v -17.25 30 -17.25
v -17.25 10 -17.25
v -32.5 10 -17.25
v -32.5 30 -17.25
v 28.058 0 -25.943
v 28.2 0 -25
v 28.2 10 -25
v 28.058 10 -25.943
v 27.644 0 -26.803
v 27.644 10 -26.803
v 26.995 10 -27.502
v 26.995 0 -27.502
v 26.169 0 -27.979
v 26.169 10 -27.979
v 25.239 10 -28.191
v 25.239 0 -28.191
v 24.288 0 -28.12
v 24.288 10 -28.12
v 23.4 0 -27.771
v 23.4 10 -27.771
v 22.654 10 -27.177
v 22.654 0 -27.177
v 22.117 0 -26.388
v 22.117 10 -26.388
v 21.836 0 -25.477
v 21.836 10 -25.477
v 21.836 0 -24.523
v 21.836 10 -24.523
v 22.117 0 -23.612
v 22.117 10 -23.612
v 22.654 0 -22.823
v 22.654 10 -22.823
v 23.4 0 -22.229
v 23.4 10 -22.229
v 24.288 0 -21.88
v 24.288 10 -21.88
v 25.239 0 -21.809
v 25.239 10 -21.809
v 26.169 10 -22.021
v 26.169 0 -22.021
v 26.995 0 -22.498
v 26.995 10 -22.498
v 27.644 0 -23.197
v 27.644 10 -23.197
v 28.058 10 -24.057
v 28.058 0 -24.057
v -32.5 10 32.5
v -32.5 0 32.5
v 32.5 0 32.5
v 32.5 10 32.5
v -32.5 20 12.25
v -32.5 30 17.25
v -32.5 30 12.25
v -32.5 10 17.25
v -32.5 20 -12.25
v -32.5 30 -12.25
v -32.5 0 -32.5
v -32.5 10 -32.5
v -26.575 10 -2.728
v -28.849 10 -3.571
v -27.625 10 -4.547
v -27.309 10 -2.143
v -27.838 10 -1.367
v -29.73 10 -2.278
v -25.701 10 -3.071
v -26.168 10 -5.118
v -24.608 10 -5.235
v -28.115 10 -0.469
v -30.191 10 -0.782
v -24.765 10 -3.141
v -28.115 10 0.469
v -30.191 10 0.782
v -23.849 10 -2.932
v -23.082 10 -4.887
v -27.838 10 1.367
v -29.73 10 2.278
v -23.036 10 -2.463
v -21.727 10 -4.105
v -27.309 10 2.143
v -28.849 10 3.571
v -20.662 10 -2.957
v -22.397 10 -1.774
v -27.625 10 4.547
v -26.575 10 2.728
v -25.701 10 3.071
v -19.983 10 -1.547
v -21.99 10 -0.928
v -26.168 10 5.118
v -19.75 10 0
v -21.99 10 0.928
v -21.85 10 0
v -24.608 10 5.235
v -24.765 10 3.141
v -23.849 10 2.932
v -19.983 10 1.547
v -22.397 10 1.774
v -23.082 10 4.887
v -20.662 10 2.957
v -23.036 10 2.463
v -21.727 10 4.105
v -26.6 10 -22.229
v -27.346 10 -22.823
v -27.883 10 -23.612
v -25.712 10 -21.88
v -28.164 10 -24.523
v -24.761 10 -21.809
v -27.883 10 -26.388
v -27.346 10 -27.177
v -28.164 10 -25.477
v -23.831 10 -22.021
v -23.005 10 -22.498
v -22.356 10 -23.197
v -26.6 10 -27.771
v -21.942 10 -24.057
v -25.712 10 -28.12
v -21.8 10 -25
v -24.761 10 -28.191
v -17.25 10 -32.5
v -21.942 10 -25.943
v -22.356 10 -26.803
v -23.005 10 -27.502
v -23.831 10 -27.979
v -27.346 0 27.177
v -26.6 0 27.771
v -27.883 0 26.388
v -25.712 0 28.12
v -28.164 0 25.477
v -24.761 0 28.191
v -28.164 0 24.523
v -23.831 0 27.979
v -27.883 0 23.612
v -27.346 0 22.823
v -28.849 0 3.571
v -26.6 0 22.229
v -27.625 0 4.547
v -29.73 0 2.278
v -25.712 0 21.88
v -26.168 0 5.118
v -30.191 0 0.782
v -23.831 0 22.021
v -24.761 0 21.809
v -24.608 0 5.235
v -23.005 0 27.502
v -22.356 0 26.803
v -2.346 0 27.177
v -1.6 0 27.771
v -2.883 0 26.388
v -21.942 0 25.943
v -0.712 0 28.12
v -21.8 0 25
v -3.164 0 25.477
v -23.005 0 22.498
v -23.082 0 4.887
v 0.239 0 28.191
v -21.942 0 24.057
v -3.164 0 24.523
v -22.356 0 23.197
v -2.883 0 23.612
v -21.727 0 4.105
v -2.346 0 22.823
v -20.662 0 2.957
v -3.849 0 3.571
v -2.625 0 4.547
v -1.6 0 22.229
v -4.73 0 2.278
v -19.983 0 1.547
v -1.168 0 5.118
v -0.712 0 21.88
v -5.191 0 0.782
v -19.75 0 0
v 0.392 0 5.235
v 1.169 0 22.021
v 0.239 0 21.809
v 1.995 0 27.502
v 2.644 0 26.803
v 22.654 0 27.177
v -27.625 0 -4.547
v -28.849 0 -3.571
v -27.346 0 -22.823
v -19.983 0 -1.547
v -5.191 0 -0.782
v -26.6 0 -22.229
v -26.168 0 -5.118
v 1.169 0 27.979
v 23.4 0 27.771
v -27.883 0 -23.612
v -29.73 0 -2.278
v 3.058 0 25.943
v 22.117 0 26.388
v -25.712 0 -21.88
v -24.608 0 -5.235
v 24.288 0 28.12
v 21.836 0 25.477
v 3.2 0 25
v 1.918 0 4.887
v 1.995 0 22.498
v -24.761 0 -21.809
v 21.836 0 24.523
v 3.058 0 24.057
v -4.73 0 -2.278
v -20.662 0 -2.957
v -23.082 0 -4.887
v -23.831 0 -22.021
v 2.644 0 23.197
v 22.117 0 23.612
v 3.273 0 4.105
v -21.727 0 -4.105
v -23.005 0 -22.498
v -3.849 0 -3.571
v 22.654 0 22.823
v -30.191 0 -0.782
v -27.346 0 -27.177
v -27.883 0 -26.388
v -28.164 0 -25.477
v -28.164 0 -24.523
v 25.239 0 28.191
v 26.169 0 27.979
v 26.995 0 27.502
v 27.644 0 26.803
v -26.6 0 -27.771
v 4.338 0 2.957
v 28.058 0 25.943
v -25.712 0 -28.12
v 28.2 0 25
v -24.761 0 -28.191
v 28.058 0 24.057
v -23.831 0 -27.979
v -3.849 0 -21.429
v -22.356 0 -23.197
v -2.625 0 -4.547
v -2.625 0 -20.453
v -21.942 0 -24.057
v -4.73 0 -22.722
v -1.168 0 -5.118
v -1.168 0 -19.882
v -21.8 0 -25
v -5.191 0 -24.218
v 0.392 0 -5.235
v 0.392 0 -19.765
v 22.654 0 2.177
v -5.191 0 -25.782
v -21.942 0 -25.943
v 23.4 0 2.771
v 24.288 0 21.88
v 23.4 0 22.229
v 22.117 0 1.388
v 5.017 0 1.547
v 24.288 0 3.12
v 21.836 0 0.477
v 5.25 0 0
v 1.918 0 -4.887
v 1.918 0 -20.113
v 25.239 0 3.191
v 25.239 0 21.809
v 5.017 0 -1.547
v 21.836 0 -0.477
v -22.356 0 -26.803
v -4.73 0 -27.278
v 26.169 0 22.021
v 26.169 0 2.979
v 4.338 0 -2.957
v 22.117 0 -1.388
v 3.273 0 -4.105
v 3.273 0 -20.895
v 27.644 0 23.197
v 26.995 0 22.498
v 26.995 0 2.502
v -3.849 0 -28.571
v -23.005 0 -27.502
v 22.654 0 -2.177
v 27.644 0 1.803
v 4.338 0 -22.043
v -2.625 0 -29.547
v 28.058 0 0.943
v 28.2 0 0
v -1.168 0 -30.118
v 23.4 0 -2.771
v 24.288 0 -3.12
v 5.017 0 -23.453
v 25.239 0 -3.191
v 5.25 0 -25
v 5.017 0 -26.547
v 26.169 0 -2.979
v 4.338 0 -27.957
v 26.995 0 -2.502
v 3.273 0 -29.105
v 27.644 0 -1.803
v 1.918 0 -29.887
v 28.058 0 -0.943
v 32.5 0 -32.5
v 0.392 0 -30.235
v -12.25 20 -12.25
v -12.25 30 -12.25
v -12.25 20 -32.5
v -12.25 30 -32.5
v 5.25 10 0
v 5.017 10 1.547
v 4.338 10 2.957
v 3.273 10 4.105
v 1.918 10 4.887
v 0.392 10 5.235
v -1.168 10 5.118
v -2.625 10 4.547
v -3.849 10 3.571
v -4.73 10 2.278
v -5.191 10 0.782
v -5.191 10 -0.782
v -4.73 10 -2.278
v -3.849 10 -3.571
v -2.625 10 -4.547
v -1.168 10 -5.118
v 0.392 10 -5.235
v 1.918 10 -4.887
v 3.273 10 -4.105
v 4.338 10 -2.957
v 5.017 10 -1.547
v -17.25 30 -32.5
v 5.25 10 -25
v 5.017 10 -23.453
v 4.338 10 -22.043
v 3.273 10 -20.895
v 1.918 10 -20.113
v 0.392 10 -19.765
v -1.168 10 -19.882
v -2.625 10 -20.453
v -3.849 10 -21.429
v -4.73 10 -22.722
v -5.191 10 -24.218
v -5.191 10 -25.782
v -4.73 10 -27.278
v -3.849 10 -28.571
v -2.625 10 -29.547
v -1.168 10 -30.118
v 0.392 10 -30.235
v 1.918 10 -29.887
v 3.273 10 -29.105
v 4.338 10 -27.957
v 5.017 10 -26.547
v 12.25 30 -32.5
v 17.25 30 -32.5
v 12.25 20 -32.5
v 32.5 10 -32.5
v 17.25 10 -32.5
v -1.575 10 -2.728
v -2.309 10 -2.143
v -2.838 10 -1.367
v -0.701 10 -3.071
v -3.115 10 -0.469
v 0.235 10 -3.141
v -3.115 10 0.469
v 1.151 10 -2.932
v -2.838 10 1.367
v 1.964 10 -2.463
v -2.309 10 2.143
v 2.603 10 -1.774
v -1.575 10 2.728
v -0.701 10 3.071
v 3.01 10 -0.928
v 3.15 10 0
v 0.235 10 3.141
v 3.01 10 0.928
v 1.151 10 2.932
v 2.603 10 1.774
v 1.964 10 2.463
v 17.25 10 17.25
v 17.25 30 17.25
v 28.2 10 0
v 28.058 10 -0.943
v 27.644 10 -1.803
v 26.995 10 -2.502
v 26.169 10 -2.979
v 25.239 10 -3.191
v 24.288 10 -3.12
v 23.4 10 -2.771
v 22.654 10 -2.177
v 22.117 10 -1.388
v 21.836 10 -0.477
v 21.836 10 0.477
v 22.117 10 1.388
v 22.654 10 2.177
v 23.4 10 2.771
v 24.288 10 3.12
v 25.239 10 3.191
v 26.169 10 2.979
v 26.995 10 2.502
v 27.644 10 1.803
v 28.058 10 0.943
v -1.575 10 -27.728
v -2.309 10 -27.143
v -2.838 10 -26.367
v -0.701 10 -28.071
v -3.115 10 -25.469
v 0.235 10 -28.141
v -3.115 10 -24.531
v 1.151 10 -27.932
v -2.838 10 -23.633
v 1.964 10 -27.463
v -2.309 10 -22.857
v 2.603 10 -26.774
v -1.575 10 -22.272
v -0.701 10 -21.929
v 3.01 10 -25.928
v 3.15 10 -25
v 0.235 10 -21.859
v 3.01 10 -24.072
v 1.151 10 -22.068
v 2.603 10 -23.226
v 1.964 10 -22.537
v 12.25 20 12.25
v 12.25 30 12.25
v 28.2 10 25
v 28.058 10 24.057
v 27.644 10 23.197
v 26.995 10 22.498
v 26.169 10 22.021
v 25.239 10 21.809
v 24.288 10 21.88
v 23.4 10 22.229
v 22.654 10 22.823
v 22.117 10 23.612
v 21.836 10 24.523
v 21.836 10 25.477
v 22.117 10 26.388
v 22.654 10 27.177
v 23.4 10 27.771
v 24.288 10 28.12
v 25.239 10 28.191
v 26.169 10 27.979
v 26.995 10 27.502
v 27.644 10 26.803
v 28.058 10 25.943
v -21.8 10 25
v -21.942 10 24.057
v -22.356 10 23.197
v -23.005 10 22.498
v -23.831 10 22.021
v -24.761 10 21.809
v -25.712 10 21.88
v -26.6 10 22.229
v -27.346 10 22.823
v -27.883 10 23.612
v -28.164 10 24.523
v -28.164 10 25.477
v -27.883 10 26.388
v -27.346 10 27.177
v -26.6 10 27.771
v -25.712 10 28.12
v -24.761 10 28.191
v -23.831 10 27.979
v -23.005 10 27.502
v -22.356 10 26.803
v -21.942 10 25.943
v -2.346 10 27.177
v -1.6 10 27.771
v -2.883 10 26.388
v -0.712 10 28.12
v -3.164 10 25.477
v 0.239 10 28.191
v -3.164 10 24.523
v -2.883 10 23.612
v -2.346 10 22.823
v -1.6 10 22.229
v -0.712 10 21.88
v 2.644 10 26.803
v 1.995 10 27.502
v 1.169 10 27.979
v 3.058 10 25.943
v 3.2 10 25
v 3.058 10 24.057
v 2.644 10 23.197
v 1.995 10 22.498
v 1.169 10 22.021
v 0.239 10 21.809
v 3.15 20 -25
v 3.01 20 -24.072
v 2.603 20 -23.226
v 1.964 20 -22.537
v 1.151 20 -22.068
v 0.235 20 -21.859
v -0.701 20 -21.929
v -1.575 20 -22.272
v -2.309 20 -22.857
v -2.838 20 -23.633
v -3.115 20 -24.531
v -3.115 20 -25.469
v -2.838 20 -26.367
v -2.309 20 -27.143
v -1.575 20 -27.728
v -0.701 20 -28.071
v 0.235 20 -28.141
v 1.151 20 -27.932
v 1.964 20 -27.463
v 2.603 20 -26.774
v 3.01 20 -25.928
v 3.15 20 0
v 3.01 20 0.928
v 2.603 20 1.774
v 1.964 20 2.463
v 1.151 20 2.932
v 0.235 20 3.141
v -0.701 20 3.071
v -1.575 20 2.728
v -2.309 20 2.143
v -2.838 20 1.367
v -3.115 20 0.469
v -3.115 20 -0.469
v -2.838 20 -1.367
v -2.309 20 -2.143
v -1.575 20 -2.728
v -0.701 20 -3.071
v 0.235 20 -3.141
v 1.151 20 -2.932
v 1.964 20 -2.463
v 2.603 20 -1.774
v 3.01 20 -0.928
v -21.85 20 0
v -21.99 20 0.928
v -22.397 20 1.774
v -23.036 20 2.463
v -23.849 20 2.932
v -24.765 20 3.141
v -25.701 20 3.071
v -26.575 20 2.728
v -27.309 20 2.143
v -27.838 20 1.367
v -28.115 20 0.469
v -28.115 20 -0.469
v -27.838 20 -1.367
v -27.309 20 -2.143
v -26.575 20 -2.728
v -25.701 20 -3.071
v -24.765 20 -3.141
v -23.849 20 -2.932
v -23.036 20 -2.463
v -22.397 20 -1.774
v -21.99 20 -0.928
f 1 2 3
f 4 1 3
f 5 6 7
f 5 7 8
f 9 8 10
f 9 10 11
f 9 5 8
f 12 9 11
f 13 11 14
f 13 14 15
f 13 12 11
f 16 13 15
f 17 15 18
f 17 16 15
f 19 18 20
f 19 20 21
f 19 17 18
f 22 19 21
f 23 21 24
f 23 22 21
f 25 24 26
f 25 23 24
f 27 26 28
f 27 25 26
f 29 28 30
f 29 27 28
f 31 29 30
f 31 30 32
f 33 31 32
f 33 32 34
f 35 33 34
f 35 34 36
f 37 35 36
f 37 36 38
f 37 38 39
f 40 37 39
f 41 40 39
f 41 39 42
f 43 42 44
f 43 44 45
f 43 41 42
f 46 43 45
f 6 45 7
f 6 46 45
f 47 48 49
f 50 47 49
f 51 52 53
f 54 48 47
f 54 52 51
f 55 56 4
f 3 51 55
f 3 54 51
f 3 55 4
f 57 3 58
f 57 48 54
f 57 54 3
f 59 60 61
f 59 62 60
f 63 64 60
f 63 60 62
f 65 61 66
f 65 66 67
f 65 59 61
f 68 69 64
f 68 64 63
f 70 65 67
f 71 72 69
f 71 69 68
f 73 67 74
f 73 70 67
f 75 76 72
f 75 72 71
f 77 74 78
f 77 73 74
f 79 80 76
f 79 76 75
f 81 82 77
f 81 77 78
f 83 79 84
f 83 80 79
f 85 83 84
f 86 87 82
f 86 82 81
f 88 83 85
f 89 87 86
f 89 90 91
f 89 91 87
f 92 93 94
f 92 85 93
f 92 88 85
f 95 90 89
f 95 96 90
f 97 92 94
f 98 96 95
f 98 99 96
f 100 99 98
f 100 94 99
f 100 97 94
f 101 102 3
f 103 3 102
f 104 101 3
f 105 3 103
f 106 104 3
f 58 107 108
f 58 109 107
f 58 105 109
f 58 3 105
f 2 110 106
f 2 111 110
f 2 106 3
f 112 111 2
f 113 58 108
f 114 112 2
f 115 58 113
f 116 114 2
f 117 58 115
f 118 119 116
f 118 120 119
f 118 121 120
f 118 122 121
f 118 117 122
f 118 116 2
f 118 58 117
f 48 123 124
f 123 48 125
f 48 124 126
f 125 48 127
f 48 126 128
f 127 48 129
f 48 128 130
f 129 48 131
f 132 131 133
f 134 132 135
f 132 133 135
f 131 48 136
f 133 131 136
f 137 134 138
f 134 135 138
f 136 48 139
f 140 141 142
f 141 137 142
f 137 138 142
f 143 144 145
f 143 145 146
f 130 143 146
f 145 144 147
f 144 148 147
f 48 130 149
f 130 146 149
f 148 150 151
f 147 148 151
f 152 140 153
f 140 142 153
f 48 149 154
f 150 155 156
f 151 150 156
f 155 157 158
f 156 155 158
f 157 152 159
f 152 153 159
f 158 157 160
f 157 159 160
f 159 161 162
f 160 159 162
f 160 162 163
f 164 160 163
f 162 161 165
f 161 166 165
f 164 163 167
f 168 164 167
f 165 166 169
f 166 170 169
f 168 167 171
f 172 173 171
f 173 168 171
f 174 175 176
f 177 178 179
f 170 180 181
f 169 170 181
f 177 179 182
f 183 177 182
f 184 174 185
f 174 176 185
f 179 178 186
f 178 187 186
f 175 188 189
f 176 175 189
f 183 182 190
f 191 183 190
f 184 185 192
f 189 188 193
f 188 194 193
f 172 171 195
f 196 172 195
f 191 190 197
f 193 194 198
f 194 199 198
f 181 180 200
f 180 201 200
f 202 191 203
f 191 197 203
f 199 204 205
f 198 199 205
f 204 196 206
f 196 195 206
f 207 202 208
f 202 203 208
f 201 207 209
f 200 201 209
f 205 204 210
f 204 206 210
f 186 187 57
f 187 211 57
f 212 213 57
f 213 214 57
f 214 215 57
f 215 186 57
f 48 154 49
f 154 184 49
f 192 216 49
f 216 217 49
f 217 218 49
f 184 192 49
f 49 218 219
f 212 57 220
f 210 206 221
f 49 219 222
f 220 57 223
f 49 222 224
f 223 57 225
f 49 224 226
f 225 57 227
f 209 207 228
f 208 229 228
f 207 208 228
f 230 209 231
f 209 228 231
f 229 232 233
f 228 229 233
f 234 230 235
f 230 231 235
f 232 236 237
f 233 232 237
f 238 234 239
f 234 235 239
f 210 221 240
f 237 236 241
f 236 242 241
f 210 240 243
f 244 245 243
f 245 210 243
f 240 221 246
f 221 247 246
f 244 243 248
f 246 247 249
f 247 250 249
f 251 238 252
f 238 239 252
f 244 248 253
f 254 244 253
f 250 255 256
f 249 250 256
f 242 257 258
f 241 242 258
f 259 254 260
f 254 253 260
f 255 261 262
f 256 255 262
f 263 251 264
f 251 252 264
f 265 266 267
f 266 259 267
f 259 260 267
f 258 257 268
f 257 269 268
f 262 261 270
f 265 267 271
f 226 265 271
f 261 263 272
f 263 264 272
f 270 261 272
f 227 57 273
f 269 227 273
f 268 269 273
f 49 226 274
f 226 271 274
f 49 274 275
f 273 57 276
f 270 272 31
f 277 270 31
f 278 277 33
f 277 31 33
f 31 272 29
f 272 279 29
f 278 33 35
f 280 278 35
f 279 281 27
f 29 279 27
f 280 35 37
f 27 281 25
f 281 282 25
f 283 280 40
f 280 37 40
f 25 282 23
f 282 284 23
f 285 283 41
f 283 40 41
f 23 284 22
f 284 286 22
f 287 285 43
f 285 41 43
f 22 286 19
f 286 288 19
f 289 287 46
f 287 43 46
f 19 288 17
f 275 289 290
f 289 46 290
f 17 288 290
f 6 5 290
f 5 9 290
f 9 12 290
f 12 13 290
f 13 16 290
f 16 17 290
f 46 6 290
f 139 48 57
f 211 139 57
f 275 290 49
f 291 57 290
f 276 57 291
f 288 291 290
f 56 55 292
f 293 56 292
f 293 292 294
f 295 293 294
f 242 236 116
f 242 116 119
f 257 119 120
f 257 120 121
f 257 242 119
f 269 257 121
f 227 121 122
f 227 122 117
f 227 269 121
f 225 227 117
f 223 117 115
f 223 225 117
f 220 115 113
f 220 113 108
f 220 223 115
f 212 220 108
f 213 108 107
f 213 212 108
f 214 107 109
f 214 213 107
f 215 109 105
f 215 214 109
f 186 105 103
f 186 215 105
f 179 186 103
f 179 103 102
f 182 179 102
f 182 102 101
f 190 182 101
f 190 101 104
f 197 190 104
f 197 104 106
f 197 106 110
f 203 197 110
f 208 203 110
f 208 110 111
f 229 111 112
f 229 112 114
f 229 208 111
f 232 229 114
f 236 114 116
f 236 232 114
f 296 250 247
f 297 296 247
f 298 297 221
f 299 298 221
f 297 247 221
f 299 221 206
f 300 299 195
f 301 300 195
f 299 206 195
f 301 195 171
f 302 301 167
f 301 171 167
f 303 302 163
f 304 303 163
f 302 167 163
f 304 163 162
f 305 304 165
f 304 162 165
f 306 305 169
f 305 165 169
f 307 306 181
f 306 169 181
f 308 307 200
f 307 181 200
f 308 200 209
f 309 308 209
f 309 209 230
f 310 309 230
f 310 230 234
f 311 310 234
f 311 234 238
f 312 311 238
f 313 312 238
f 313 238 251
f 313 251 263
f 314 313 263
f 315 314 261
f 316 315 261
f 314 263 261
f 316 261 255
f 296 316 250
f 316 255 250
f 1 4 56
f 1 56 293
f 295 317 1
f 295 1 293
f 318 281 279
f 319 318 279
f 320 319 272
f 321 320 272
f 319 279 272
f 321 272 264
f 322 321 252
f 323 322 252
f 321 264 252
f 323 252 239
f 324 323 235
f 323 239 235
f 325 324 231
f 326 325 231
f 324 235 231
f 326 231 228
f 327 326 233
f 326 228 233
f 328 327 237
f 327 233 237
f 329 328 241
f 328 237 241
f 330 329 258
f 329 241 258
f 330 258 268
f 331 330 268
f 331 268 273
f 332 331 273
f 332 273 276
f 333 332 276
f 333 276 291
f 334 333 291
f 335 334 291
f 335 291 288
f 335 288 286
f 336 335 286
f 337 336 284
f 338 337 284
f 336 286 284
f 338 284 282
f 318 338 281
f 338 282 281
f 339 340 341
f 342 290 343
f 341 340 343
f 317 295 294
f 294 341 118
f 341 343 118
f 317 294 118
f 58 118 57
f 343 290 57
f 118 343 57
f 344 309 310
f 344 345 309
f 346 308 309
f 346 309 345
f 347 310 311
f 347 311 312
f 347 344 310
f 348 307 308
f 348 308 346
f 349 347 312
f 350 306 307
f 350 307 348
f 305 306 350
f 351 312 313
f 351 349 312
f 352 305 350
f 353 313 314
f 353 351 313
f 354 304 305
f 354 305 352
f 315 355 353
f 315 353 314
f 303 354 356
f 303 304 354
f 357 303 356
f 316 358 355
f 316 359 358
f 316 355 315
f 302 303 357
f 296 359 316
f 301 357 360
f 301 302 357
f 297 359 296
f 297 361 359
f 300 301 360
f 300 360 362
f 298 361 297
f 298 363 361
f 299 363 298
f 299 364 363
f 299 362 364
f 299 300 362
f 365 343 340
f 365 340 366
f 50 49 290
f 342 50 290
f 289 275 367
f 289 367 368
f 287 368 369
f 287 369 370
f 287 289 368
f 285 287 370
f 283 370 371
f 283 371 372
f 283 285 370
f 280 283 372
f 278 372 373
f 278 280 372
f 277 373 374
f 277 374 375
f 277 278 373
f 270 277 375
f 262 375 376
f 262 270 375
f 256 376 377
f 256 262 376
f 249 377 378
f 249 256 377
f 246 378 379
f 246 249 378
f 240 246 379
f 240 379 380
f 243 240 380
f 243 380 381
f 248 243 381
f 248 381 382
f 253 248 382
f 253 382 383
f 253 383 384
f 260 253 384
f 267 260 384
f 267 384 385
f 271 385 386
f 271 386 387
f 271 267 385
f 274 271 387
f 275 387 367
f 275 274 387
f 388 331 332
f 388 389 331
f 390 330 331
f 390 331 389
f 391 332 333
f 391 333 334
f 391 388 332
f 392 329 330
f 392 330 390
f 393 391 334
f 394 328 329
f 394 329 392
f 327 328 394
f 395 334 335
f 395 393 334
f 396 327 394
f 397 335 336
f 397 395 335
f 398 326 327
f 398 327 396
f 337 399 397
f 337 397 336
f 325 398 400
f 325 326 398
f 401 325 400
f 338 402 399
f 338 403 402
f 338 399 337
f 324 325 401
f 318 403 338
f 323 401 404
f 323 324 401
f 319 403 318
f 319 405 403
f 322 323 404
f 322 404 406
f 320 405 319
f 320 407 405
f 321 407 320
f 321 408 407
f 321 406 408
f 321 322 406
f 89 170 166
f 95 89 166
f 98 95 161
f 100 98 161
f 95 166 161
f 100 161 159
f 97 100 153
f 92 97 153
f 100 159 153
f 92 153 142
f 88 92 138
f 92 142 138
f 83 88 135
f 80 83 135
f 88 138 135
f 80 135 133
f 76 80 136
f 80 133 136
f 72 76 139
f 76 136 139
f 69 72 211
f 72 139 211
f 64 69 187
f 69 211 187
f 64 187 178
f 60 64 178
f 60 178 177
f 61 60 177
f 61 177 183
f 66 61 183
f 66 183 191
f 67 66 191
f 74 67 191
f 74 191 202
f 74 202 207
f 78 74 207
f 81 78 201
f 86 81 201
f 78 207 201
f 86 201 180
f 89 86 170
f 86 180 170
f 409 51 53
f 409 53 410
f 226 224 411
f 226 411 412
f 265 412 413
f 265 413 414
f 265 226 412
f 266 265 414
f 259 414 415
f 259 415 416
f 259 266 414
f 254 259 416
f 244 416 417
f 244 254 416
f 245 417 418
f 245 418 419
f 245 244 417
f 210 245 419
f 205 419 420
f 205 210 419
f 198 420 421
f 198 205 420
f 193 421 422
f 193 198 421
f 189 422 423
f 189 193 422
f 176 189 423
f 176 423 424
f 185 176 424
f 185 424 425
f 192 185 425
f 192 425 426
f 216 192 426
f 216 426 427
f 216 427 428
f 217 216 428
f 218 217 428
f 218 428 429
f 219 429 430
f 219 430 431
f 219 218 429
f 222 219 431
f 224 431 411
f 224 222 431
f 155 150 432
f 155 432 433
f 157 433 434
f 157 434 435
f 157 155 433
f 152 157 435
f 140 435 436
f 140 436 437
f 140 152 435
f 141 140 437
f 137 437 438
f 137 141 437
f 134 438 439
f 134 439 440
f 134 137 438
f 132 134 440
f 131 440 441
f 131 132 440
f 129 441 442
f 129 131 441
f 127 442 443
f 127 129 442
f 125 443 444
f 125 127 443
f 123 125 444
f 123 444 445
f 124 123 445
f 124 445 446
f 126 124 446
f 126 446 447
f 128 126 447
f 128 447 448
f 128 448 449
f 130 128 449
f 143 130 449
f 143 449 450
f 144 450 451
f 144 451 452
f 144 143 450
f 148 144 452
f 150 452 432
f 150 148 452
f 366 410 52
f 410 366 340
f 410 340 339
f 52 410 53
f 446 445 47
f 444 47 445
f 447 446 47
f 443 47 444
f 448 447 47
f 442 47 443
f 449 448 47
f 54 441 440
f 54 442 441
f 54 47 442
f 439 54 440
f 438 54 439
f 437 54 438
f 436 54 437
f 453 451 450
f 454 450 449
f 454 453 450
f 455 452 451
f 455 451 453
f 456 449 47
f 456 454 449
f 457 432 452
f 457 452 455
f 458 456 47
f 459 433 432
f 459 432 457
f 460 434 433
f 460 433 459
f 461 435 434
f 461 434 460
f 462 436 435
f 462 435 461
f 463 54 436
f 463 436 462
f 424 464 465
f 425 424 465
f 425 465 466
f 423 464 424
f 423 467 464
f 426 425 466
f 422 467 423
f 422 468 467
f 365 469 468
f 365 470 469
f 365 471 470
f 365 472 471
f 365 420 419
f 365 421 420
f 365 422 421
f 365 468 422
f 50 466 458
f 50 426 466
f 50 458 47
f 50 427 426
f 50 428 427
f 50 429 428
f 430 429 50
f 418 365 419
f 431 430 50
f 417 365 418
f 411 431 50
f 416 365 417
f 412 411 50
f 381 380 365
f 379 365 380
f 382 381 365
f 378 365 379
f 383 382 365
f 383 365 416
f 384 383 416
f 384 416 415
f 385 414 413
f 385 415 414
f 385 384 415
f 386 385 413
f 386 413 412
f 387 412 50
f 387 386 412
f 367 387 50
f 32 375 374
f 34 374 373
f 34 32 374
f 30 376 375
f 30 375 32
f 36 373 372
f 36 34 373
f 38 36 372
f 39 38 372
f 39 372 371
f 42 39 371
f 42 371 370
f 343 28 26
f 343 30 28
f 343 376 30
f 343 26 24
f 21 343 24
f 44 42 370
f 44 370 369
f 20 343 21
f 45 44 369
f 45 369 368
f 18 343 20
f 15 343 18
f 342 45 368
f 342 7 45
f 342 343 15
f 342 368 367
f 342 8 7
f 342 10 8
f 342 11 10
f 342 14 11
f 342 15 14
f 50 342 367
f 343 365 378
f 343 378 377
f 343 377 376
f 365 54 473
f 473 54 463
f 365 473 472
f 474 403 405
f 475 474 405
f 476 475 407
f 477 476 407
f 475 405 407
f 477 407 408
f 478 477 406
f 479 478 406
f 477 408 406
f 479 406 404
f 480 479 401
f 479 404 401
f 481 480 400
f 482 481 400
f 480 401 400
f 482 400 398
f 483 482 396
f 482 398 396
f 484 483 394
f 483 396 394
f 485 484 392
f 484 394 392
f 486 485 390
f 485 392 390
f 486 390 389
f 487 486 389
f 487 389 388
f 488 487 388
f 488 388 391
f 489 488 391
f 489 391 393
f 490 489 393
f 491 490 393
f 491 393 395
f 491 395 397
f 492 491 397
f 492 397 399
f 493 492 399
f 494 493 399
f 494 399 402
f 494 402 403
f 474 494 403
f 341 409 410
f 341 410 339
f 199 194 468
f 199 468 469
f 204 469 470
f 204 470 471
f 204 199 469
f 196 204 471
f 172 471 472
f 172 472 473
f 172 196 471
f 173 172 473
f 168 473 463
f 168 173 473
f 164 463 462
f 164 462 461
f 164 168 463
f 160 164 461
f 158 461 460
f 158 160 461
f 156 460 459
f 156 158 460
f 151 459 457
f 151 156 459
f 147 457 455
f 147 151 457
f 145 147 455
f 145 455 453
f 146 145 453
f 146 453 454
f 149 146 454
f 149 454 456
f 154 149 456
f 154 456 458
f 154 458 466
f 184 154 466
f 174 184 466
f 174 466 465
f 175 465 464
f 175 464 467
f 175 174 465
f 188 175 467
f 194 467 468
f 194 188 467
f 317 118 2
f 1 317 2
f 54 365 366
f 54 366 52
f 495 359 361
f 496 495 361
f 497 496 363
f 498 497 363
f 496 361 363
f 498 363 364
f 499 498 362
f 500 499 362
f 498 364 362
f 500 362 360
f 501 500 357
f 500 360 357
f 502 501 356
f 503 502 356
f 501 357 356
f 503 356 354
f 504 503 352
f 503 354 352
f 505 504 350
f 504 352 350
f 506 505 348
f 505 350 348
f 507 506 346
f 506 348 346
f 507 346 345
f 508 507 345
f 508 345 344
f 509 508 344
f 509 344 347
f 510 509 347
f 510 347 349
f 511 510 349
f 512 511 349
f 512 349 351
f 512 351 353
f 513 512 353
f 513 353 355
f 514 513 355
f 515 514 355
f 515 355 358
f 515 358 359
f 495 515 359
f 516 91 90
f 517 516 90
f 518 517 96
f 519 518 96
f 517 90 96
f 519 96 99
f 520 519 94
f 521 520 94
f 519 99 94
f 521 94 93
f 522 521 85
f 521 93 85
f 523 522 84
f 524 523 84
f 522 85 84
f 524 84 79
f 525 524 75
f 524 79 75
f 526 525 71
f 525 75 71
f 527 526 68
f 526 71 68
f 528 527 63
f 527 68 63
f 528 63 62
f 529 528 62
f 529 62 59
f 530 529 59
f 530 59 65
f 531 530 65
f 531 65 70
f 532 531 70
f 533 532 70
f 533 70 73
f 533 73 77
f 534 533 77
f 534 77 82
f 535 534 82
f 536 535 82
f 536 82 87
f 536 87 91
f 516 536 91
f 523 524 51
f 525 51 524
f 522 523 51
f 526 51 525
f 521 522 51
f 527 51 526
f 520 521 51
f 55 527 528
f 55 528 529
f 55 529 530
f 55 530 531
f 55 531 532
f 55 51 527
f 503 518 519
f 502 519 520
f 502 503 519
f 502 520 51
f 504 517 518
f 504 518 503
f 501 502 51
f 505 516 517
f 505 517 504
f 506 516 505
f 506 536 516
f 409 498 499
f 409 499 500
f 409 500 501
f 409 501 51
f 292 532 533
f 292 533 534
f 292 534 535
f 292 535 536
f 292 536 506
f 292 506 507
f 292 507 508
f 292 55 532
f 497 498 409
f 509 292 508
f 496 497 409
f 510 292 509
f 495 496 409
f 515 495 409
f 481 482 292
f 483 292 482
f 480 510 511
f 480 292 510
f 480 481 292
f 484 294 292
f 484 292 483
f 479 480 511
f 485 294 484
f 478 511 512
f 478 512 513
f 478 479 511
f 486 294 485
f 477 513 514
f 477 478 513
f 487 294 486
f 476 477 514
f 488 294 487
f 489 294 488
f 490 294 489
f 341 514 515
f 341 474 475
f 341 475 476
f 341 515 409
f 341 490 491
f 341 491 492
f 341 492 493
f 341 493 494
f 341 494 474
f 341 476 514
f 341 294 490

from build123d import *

# Parameters (mm, degrees)
SKETCH_1_W          = 65
SKETCH_1_H          = 65
SKETCH_1_R          = 3.2
EXTRUDE_1_DEPTH     = 10
EXTRUDE_3_DEPTH     = 10
SKETCH_4_R          = 5.25
CUT_EXTRUDE_1_DEPTH = 10
SKETCH_5_R          = 3.15
CUT_EXTRUDE_2_DEPTH = 20
EXTRUDE_4_DEPTH     = 20


with BuildPart() as part:
    # 스케치1 → 보스-돌출1 (new body)
    with BuildSketch(Plane(origin=(0, 0, 0), x_dir=(1, 0, 0), z_dir=(0, 1, 0))):
        Rectangle(SKETCH_1_W, SKETCH_1_H)
        with Locations((25, 0)):
            Circle(SKETCH_1_R, mode=Mode.SUBTRACT)
        with Locations((0, -25)):
            Circle(SKETCH_1_R, mode=Mode.SUBTRACT)
        with Locations((25, 25)):
            Circle(SKETCH_1_R, mode=Mode.SUBTRACT)
        with Locations((-25, 25)):
            Circle(SKETCH_1_R, mode=Mode.SUBTRACT)
        with Locations((25, -25)):
            Circle(SKETCH_1_R, mode=Mode.SUBTRACT)
        with Locations((-25, -25)):
            Circle(SKETCH_1_R, mode=Mode.SUBTRACT)
    extrude(amount=EXTRUDE_1_DEPTH)

    # 스케치2 → 보스-돌출3 (add)
    with BuildSketch(Plane(origin=(0, 10, 0), x_dir=(1, 0, 0), z_dir=(0, 1, 0))):
        Polygon((-32.5, -12.25), (12.25, -12.25), (12.25, 32.5), (-12.25, 32.5), (-12.25, 12.25), (-32.5, 12.25), align=None)
    extrude(amount=EXTRUDE_3_DEPTH)

    # 스케치4 → 컷-돌출1 (cut)
    with BuildSketch(Plane.XZ):
        Circle(SKETCH_4_R)
        with Locations((-25, 0)):
            Circle(SKETCH_4_R)
        with Locations((0, -25)):
            Circle(SKETCH_4_R)
    extrude(amount=-CUT_EXTRUDE_1_DEPTH, mode=Mode.SUBTRACT)

    # 스케치5 → 컷-돌출2 (cut)
    with BuildSketch(Plane.XZ):
        Circle(SKETCH_5_R)
        with Locations((0, -25)):
            Circle(SKETCH_5_R)
        with Locations((-25, 0)):
            Circle(SKETCH_5_R)
    extrude(amount=-CUT_EXTRUDE_2_DEPTH, mode=Mode.SUBTRACT)

    # 스케치6 → 보스-돌출4 (add)
    with BuildSketch(Plane(origin=(0, 10, 0), x_dir=(1, 0, 0), z_dir=(0, 1, 0))):
        Polygon((-12.25, 32.5), (-17.25, 32.5), (-17.25, 17.25), (-32.5, 17.25), (-32.5, 12.25), (-12.25, 12.25), align=None)
        Polygon((12.25, 32.5), (17.25, 32.5), (17.25, -17.25), (-32.5, -17.25), (-32.5, -12.25), (12.25, -12.25), align=None)
    extrude(amount=EXTRUDE_4_DEPTH)


solid = part.part
